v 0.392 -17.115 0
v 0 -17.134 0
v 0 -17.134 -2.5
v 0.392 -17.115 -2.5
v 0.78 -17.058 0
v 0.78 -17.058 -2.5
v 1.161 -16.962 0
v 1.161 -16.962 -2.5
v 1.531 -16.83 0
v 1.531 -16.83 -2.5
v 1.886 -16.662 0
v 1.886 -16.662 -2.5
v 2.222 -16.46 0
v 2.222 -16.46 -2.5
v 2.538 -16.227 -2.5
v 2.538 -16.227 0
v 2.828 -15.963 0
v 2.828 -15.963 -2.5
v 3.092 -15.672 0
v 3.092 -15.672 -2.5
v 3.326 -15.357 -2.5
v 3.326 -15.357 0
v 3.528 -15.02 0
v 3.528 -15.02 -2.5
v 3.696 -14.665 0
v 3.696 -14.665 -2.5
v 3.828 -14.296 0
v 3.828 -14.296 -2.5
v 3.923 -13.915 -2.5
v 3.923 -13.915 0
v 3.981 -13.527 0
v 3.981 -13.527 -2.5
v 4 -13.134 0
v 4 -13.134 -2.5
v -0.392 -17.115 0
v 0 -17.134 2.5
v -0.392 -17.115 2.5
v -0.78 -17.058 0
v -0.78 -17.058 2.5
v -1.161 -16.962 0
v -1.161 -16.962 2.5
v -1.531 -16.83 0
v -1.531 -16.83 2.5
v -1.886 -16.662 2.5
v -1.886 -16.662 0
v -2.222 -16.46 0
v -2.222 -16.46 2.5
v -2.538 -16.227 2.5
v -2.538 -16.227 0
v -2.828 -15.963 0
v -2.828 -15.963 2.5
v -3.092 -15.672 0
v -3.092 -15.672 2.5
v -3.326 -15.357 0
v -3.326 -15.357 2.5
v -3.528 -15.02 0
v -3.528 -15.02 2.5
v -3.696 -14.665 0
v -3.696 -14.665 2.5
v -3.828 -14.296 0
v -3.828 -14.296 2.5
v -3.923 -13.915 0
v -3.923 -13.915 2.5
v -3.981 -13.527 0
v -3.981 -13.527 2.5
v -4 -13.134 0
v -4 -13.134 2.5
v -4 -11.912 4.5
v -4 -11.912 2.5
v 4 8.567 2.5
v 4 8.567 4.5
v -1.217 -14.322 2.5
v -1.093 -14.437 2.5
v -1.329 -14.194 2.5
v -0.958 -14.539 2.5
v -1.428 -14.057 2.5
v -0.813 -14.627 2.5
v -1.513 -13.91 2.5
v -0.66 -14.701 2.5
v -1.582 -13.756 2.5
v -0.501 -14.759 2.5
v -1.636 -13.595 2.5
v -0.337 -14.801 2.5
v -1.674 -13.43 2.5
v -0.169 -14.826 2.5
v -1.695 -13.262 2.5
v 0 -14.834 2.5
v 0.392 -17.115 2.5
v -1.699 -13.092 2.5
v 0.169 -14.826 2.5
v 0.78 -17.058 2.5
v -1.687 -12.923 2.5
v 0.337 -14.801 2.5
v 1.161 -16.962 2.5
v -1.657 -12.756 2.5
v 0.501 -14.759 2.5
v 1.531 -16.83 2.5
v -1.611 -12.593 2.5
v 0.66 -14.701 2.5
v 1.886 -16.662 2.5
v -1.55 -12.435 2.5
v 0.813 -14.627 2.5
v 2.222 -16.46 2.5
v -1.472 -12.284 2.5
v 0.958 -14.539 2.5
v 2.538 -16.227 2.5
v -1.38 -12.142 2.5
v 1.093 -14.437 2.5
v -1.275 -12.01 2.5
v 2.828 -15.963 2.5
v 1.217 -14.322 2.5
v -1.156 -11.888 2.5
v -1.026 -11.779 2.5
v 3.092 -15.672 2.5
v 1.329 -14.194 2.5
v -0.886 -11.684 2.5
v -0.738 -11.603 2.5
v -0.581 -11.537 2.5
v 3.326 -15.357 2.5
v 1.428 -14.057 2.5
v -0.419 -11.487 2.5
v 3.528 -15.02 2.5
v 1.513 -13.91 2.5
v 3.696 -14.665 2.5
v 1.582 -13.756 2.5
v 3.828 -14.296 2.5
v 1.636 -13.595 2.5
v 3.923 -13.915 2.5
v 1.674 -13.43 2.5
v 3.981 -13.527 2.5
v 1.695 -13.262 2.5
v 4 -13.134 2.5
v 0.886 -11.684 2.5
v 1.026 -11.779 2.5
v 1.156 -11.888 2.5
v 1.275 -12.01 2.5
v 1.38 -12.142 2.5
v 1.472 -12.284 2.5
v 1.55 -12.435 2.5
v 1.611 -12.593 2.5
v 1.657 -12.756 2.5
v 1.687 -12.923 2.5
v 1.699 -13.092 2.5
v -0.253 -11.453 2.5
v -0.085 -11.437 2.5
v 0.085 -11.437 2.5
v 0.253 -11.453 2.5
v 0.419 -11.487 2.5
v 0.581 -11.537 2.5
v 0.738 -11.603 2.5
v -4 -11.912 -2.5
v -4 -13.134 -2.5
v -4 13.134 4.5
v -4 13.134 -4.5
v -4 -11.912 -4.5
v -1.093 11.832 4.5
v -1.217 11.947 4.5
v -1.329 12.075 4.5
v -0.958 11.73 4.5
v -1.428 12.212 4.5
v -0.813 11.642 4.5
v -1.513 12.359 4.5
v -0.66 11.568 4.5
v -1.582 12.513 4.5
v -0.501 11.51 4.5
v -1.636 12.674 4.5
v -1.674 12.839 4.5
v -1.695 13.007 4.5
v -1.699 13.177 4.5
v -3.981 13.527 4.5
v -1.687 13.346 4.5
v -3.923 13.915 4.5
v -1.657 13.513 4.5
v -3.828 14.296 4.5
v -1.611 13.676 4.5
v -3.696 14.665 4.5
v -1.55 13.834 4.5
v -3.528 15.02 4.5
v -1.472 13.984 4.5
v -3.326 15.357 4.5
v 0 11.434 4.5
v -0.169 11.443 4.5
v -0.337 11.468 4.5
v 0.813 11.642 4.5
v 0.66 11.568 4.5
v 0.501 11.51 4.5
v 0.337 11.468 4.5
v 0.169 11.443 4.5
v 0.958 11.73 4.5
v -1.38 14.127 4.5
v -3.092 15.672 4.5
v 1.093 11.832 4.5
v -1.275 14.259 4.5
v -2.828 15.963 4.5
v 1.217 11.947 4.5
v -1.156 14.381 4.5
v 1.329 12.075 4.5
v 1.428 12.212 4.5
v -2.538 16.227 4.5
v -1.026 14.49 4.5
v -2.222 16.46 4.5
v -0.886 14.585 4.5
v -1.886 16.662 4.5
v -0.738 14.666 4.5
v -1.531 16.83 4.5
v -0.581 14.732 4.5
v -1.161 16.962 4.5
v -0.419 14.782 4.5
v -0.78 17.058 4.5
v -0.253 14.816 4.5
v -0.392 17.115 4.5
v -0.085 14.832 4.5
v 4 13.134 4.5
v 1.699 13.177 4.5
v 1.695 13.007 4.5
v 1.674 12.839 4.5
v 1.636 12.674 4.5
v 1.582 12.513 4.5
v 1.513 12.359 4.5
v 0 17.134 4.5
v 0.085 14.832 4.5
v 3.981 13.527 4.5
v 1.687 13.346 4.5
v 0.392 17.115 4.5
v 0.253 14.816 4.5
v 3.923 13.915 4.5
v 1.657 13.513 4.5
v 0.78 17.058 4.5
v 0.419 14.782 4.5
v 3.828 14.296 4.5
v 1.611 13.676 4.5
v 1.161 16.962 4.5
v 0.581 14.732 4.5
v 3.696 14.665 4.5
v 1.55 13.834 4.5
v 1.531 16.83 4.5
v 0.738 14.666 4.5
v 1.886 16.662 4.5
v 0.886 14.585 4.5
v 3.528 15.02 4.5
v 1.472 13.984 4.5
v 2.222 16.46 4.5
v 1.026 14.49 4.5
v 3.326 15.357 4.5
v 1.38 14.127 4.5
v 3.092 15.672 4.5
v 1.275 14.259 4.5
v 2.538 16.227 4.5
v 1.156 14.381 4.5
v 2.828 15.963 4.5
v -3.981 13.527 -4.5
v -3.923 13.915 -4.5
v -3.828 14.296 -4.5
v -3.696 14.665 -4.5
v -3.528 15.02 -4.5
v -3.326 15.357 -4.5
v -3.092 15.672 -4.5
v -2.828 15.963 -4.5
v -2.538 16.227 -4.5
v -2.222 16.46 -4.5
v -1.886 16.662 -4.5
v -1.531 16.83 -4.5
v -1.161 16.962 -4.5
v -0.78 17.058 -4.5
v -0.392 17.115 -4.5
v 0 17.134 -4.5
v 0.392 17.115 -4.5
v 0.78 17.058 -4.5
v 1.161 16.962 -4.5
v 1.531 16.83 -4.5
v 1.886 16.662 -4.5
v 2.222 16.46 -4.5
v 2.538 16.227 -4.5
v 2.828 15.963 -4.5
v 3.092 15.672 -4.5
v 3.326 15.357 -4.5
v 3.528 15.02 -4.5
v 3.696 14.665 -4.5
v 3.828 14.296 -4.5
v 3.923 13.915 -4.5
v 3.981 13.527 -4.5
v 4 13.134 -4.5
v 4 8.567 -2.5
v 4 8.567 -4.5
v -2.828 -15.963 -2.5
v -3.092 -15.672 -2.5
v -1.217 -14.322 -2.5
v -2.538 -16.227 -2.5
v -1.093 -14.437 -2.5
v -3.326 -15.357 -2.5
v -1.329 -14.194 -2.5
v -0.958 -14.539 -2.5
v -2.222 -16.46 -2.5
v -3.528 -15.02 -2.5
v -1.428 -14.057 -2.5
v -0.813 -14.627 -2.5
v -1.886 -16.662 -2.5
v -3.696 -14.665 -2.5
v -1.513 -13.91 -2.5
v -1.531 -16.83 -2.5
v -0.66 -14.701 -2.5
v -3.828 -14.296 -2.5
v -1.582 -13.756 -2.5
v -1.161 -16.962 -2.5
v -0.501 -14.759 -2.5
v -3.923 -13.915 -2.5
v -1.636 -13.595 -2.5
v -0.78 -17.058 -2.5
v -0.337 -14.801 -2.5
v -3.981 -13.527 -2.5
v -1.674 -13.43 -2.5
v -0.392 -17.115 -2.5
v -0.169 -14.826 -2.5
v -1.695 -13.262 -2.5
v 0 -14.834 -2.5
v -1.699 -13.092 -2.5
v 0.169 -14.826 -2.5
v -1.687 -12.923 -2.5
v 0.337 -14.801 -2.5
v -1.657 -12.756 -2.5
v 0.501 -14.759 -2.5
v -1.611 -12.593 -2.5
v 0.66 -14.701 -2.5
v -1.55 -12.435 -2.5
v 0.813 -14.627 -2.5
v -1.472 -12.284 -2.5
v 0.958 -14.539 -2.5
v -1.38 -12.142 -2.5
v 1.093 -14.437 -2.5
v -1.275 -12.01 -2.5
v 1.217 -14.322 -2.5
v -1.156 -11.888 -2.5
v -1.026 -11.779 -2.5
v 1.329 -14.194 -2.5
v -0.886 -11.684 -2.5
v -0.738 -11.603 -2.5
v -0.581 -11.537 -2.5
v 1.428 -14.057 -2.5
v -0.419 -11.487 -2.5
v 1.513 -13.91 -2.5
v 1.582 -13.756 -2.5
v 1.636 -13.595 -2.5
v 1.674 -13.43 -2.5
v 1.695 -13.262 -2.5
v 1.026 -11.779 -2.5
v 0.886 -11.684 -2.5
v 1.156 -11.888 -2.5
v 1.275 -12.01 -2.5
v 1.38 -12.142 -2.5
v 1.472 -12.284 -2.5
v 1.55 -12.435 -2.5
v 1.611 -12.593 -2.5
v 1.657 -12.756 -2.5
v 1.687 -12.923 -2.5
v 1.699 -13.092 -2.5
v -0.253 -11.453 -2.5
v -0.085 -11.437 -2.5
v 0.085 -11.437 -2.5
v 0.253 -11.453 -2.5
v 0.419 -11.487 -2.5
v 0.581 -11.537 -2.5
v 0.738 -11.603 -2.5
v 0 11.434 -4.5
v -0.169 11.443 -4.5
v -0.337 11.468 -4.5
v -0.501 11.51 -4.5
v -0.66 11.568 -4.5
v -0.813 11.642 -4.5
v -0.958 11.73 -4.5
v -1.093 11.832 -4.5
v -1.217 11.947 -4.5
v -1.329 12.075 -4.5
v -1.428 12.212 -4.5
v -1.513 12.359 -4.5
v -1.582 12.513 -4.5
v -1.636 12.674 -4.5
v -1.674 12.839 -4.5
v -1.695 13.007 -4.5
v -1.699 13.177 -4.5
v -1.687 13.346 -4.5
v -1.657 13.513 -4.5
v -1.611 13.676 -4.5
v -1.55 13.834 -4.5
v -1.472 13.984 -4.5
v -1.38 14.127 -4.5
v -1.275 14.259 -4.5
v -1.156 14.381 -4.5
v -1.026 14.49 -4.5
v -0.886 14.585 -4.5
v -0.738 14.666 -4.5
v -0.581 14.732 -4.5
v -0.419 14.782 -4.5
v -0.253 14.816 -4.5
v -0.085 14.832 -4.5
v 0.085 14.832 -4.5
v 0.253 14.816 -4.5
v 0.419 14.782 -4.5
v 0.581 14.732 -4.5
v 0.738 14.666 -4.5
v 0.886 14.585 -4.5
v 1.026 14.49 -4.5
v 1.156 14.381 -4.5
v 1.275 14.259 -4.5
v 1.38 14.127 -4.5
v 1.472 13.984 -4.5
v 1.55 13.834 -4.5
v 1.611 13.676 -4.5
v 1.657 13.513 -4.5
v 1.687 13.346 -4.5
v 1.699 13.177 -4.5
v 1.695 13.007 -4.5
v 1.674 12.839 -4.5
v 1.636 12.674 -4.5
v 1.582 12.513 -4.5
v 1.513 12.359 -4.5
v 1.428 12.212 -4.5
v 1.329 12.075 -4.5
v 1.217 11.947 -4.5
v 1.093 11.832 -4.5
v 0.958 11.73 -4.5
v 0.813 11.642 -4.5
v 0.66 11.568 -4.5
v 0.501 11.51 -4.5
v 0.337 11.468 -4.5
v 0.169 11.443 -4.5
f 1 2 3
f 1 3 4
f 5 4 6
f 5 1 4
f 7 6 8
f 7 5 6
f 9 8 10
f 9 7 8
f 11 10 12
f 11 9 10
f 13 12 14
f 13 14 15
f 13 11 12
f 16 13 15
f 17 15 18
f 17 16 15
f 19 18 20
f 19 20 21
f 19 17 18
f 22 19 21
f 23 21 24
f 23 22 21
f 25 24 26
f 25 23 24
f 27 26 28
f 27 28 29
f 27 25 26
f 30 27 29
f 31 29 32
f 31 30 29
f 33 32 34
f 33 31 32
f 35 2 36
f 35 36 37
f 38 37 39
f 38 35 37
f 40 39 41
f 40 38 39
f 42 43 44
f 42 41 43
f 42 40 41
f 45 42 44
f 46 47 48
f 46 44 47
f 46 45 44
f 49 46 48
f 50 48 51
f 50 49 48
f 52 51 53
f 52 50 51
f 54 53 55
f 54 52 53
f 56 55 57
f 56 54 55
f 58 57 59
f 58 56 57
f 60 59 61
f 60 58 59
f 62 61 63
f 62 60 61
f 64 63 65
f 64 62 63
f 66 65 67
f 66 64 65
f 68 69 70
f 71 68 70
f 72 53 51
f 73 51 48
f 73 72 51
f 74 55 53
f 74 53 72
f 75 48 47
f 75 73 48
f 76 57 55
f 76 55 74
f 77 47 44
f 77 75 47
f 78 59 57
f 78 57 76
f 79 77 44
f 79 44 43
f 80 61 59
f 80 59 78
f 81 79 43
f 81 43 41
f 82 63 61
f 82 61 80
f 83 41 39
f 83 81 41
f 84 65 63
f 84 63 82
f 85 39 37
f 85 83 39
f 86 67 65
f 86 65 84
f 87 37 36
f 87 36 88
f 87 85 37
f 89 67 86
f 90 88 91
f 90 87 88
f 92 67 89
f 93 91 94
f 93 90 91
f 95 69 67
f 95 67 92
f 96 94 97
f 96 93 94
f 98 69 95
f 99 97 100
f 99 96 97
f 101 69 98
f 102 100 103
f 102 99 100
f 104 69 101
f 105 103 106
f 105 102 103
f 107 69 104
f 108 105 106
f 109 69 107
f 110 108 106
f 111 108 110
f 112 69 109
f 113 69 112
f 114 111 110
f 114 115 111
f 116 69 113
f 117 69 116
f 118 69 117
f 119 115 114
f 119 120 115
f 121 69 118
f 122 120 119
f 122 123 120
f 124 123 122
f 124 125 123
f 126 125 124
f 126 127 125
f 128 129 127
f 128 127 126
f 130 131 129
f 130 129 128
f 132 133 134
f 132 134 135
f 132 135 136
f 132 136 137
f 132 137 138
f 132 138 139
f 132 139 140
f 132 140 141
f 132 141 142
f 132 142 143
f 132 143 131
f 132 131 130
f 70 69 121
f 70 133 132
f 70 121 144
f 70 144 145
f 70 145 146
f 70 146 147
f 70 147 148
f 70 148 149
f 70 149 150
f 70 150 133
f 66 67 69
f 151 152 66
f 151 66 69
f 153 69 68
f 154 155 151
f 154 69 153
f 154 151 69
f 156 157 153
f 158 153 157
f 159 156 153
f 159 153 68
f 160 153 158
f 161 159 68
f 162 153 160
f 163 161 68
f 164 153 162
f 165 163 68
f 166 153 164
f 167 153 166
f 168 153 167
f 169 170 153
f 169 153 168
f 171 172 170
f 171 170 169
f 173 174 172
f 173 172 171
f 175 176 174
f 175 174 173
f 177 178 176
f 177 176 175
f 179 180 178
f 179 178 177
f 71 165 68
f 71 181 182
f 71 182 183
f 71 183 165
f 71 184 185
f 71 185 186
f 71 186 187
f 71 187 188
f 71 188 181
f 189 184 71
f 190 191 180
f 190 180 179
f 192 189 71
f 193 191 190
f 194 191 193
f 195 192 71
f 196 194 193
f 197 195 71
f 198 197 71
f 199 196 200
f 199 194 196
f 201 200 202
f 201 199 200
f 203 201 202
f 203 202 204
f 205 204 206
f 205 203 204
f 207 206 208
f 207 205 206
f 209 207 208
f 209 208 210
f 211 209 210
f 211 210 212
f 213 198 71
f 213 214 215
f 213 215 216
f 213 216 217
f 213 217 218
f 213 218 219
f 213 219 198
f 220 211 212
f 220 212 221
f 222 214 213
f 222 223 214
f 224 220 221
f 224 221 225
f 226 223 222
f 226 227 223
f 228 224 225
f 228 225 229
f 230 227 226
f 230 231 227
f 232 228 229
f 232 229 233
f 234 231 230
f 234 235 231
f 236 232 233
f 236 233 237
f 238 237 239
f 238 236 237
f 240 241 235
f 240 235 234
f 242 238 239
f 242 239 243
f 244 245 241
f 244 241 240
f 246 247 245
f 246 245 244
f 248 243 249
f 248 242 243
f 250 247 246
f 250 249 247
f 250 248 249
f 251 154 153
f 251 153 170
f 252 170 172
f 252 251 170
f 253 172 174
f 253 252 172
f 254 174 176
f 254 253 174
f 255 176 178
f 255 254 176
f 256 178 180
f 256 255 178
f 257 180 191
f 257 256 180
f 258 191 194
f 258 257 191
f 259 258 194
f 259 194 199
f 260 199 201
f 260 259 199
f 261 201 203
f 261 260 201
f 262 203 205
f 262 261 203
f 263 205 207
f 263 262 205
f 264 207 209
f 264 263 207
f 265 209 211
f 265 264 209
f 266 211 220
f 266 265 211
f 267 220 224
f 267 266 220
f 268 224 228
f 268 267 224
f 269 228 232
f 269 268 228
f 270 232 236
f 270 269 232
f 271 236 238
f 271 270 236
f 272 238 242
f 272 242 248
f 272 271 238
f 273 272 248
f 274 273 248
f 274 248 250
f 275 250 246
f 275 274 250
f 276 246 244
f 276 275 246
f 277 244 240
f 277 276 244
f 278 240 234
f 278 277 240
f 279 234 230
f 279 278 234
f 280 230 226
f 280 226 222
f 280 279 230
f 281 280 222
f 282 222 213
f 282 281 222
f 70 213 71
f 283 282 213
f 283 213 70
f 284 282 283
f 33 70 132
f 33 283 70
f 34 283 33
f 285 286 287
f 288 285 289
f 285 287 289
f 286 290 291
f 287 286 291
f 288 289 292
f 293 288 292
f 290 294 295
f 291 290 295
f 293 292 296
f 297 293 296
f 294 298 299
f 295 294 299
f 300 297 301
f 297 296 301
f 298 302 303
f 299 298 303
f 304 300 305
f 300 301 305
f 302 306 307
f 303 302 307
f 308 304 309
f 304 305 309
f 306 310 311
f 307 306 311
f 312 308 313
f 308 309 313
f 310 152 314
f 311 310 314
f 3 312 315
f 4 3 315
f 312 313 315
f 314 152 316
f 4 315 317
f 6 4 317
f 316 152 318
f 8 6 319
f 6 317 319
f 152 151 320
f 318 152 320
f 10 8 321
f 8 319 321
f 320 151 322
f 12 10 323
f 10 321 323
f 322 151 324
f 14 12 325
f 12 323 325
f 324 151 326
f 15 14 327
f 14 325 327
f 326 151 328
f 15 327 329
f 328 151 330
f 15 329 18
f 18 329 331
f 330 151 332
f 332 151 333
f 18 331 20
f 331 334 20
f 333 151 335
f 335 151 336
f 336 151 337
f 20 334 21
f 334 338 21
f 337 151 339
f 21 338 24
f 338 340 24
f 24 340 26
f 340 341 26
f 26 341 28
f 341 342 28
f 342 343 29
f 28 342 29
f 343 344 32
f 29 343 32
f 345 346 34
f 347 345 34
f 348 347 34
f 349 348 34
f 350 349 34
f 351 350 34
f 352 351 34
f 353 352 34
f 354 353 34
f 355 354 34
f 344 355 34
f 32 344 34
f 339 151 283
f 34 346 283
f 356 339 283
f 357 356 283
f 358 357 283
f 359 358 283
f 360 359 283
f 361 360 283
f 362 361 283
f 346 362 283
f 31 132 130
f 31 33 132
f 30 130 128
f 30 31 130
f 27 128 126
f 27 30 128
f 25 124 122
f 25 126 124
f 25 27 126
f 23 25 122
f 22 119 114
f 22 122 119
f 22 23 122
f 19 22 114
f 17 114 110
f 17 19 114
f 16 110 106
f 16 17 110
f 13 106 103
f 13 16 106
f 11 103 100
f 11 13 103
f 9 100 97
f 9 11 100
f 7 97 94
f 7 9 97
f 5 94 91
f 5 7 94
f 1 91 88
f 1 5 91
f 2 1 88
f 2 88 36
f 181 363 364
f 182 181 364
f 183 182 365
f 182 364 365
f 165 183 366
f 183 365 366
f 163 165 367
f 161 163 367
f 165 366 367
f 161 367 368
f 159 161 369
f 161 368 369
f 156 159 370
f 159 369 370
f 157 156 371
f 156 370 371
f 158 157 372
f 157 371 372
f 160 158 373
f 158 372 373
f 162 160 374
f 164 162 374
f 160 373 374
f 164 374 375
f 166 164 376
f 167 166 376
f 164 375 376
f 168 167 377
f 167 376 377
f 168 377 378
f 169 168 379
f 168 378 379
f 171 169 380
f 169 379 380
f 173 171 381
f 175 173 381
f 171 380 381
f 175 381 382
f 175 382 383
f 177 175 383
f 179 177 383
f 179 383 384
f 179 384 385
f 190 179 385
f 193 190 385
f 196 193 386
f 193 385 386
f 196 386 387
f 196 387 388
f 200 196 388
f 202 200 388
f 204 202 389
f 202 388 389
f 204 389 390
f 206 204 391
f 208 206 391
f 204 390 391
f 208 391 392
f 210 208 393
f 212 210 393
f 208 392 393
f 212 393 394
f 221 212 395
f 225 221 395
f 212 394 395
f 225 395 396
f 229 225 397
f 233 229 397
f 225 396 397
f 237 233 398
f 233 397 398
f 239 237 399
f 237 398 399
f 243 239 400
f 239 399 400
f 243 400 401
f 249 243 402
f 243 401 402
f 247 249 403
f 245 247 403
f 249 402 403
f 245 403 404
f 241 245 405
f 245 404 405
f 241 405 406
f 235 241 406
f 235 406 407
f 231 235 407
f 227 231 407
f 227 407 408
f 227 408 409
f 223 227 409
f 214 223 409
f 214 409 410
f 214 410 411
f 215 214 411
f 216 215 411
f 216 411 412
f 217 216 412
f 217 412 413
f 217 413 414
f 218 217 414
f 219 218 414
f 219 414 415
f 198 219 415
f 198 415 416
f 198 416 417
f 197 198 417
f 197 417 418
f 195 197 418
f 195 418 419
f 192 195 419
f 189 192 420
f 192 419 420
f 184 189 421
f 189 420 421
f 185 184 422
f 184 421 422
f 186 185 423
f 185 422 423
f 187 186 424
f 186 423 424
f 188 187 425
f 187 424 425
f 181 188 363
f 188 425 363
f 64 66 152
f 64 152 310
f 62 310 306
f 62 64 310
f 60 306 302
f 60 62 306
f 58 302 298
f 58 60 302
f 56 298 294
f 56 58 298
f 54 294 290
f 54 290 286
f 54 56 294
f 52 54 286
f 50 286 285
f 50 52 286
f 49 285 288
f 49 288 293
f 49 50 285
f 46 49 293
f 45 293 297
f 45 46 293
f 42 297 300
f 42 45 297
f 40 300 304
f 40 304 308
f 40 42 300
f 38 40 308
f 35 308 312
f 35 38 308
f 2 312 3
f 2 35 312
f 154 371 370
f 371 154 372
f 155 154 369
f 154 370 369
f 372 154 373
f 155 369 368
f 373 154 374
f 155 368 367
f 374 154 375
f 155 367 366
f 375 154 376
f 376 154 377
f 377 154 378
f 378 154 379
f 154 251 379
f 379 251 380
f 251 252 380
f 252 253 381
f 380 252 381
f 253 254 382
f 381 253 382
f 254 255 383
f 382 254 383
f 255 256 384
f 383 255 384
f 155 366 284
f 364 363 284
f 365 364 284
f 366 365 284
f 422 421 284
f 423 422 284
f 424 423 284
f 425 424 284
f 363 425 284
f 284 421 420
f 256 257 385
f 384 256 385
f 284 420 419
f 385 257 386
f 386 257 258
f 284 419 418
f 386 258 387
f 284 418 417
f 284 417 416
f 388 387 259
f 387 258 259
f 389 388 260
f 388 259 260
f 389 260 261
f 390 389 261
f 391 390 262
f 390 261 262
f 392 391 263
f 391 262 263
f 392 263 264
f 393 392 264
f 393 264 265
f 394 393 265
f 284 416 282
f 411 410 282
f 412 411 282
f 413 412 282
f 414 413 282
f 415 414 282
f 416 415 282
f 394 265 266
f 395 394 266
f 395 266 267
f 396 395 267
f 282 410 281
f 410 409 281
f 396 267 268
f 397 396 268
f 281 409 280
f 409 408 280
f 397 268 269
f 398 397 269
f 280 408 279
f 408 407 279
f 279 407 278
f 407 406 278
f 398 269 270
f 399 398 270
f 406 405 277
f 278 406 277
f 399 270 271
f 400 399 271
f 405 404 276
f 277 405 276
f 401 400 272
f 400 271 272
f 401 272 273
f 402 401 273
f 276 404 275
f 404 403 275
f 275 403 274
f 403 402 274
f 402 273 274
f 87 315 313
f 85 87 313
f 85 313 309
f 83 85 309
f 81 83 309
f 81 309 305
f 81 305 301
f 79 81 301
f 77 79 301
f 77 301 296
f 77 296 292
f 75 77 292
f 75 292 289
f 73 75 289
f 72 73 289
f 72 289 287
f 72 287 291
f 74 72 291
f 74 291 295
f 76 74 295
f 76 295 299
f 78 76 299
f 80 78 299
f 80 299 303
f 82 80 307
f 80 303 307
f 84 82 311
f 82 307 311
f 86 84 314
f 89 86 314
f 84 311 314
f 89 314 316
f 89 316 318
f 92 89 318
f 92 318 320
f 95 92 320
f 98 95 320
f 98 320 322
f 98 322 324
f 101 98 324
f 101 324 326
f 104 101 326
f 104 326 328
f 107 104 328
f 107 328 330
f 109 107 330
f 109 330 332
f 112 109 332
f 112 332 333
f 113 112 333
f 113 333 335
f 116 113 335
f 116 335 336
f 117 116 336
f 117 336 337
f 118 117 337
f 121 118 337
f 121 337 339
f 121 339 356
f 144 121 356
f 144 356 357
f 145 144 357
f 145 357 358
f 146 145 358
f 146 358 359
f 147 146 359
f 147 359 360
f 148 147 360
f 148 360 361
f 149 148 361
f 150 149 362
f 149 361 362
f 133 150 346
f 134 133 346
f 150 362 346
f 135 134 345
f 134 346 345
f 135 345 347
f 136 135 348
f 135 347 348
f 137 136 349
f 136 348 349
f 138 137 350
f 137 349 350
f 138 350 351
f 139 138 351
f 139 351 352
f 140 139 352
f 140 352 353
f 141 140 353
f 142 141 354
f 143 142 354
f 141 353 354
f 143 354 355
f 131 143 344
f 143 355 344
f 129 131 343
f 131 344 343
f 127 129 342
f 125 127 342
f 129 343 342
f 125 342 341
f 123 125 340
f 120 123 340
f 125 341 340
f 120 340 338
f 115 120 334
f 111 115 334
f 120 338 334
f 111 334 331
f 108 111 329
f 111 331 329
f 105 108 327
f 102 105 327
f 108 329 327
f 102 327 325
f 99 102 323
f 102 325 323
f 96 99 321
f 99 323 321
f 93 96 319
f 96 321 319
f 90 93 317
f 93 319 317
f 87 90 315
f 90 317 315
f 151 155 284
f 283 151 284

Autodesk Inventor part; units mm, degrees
ref_plane "YZ Plane" through (0, 0, 0) normal (1, 0, 0) x (0, 1, 0)
ref_plane "XZ Plane" through (0, 0, 0) normal (0, 1, 0) x (-1, 0, 0)
ref_plane "XY Plane" through (0, 0, 0) normal (0, 0, 1) x (1, 0, 0)
sketch "Sketch1" plane through (0, 0, 0) normal (0, 0, 1) x (1, 0, 0)
  line L0 (0, 17.1345) -> (0, 17.1345)
  line L1 (4, 13.1345) -> (4, 8.5672)
  line L2 (0, -17.1345) -> (0, -17.1345)
  line L3 (-4, -13.1345) -> (-4, -11.9123)
  line L4 (-4, 17.1345) -> (0, 17.1345) construction
  line L5 (0, 17.1345) -> (0, 0) construction
  line L6 (0, 0) -> (-4, 0) construction
  line L7 (-4, 0) -> (-4, 17.1345) construction
  arc A0 (4, 13.1345) -> (0, 17.1345) centre (0, 13.1345) ccw
  arc A1 (0, 17.1345) -> (-4, 13.1345) centre (0, 13.1345) ccw
  arc A2 (-4, -13.1345) -> (0, -17.1345) centre (0, -13.1345) ccw
  arc A3 (0, -17.1345) -> (4, -13.1345) centre (0, -13.1345) ccw
  line L8 (-4, -11.9123) -> (4, 8.5672)
  line L9 (4, 8.5672) -> (4, -13.1345)
  line L10 (-4, -11.9123) -> (-4, 13.1345)
  dimension "d0" = 4
  dimension "d6" = 26.269
extrude "Extrusion1" add sketch "Sketch1" along normal mid plane 9 contours L1 L8 L10 A1 A0
extrude "Extrusion2" add sketch "Sketch1" along normal mid plane 5 contours L9 A3 A2 L3 L8
sketch "Sketch2" plane through (0, 0, 4.5) normal (0, 0, 1) x (1, 0, 0)
  arc A0 (4, 13.1345) -> (-4, 13.1345) centre (0, 13.1345) ccw construction
  line L0 (-4, -13.1345) -> (-4, -11.9123) projected
  arc A1 (-4, -13.1345) -> (4, -13.1345) centre (0, -13.1345) ccw projected
  line L1 (4, 8.5672) -> (4, -13.1345) projected
  line L2 (-4, -11.9123) -> (4, 8.5672) projected
  point P0 (0, 0)
hole "Hole1" at (0, 13.1345, 4.5) at (0, -13.1345, 4.5) direction (0, 0, -1) diameter 3.4 end through all clearance for "Socket Head Cap Screw" size "M3" standard "Ansi Metric M Profile"
equation "\"d6\" = LengthC"
equation "\"LengthC\" = 26.268959"
properties part number "F"
